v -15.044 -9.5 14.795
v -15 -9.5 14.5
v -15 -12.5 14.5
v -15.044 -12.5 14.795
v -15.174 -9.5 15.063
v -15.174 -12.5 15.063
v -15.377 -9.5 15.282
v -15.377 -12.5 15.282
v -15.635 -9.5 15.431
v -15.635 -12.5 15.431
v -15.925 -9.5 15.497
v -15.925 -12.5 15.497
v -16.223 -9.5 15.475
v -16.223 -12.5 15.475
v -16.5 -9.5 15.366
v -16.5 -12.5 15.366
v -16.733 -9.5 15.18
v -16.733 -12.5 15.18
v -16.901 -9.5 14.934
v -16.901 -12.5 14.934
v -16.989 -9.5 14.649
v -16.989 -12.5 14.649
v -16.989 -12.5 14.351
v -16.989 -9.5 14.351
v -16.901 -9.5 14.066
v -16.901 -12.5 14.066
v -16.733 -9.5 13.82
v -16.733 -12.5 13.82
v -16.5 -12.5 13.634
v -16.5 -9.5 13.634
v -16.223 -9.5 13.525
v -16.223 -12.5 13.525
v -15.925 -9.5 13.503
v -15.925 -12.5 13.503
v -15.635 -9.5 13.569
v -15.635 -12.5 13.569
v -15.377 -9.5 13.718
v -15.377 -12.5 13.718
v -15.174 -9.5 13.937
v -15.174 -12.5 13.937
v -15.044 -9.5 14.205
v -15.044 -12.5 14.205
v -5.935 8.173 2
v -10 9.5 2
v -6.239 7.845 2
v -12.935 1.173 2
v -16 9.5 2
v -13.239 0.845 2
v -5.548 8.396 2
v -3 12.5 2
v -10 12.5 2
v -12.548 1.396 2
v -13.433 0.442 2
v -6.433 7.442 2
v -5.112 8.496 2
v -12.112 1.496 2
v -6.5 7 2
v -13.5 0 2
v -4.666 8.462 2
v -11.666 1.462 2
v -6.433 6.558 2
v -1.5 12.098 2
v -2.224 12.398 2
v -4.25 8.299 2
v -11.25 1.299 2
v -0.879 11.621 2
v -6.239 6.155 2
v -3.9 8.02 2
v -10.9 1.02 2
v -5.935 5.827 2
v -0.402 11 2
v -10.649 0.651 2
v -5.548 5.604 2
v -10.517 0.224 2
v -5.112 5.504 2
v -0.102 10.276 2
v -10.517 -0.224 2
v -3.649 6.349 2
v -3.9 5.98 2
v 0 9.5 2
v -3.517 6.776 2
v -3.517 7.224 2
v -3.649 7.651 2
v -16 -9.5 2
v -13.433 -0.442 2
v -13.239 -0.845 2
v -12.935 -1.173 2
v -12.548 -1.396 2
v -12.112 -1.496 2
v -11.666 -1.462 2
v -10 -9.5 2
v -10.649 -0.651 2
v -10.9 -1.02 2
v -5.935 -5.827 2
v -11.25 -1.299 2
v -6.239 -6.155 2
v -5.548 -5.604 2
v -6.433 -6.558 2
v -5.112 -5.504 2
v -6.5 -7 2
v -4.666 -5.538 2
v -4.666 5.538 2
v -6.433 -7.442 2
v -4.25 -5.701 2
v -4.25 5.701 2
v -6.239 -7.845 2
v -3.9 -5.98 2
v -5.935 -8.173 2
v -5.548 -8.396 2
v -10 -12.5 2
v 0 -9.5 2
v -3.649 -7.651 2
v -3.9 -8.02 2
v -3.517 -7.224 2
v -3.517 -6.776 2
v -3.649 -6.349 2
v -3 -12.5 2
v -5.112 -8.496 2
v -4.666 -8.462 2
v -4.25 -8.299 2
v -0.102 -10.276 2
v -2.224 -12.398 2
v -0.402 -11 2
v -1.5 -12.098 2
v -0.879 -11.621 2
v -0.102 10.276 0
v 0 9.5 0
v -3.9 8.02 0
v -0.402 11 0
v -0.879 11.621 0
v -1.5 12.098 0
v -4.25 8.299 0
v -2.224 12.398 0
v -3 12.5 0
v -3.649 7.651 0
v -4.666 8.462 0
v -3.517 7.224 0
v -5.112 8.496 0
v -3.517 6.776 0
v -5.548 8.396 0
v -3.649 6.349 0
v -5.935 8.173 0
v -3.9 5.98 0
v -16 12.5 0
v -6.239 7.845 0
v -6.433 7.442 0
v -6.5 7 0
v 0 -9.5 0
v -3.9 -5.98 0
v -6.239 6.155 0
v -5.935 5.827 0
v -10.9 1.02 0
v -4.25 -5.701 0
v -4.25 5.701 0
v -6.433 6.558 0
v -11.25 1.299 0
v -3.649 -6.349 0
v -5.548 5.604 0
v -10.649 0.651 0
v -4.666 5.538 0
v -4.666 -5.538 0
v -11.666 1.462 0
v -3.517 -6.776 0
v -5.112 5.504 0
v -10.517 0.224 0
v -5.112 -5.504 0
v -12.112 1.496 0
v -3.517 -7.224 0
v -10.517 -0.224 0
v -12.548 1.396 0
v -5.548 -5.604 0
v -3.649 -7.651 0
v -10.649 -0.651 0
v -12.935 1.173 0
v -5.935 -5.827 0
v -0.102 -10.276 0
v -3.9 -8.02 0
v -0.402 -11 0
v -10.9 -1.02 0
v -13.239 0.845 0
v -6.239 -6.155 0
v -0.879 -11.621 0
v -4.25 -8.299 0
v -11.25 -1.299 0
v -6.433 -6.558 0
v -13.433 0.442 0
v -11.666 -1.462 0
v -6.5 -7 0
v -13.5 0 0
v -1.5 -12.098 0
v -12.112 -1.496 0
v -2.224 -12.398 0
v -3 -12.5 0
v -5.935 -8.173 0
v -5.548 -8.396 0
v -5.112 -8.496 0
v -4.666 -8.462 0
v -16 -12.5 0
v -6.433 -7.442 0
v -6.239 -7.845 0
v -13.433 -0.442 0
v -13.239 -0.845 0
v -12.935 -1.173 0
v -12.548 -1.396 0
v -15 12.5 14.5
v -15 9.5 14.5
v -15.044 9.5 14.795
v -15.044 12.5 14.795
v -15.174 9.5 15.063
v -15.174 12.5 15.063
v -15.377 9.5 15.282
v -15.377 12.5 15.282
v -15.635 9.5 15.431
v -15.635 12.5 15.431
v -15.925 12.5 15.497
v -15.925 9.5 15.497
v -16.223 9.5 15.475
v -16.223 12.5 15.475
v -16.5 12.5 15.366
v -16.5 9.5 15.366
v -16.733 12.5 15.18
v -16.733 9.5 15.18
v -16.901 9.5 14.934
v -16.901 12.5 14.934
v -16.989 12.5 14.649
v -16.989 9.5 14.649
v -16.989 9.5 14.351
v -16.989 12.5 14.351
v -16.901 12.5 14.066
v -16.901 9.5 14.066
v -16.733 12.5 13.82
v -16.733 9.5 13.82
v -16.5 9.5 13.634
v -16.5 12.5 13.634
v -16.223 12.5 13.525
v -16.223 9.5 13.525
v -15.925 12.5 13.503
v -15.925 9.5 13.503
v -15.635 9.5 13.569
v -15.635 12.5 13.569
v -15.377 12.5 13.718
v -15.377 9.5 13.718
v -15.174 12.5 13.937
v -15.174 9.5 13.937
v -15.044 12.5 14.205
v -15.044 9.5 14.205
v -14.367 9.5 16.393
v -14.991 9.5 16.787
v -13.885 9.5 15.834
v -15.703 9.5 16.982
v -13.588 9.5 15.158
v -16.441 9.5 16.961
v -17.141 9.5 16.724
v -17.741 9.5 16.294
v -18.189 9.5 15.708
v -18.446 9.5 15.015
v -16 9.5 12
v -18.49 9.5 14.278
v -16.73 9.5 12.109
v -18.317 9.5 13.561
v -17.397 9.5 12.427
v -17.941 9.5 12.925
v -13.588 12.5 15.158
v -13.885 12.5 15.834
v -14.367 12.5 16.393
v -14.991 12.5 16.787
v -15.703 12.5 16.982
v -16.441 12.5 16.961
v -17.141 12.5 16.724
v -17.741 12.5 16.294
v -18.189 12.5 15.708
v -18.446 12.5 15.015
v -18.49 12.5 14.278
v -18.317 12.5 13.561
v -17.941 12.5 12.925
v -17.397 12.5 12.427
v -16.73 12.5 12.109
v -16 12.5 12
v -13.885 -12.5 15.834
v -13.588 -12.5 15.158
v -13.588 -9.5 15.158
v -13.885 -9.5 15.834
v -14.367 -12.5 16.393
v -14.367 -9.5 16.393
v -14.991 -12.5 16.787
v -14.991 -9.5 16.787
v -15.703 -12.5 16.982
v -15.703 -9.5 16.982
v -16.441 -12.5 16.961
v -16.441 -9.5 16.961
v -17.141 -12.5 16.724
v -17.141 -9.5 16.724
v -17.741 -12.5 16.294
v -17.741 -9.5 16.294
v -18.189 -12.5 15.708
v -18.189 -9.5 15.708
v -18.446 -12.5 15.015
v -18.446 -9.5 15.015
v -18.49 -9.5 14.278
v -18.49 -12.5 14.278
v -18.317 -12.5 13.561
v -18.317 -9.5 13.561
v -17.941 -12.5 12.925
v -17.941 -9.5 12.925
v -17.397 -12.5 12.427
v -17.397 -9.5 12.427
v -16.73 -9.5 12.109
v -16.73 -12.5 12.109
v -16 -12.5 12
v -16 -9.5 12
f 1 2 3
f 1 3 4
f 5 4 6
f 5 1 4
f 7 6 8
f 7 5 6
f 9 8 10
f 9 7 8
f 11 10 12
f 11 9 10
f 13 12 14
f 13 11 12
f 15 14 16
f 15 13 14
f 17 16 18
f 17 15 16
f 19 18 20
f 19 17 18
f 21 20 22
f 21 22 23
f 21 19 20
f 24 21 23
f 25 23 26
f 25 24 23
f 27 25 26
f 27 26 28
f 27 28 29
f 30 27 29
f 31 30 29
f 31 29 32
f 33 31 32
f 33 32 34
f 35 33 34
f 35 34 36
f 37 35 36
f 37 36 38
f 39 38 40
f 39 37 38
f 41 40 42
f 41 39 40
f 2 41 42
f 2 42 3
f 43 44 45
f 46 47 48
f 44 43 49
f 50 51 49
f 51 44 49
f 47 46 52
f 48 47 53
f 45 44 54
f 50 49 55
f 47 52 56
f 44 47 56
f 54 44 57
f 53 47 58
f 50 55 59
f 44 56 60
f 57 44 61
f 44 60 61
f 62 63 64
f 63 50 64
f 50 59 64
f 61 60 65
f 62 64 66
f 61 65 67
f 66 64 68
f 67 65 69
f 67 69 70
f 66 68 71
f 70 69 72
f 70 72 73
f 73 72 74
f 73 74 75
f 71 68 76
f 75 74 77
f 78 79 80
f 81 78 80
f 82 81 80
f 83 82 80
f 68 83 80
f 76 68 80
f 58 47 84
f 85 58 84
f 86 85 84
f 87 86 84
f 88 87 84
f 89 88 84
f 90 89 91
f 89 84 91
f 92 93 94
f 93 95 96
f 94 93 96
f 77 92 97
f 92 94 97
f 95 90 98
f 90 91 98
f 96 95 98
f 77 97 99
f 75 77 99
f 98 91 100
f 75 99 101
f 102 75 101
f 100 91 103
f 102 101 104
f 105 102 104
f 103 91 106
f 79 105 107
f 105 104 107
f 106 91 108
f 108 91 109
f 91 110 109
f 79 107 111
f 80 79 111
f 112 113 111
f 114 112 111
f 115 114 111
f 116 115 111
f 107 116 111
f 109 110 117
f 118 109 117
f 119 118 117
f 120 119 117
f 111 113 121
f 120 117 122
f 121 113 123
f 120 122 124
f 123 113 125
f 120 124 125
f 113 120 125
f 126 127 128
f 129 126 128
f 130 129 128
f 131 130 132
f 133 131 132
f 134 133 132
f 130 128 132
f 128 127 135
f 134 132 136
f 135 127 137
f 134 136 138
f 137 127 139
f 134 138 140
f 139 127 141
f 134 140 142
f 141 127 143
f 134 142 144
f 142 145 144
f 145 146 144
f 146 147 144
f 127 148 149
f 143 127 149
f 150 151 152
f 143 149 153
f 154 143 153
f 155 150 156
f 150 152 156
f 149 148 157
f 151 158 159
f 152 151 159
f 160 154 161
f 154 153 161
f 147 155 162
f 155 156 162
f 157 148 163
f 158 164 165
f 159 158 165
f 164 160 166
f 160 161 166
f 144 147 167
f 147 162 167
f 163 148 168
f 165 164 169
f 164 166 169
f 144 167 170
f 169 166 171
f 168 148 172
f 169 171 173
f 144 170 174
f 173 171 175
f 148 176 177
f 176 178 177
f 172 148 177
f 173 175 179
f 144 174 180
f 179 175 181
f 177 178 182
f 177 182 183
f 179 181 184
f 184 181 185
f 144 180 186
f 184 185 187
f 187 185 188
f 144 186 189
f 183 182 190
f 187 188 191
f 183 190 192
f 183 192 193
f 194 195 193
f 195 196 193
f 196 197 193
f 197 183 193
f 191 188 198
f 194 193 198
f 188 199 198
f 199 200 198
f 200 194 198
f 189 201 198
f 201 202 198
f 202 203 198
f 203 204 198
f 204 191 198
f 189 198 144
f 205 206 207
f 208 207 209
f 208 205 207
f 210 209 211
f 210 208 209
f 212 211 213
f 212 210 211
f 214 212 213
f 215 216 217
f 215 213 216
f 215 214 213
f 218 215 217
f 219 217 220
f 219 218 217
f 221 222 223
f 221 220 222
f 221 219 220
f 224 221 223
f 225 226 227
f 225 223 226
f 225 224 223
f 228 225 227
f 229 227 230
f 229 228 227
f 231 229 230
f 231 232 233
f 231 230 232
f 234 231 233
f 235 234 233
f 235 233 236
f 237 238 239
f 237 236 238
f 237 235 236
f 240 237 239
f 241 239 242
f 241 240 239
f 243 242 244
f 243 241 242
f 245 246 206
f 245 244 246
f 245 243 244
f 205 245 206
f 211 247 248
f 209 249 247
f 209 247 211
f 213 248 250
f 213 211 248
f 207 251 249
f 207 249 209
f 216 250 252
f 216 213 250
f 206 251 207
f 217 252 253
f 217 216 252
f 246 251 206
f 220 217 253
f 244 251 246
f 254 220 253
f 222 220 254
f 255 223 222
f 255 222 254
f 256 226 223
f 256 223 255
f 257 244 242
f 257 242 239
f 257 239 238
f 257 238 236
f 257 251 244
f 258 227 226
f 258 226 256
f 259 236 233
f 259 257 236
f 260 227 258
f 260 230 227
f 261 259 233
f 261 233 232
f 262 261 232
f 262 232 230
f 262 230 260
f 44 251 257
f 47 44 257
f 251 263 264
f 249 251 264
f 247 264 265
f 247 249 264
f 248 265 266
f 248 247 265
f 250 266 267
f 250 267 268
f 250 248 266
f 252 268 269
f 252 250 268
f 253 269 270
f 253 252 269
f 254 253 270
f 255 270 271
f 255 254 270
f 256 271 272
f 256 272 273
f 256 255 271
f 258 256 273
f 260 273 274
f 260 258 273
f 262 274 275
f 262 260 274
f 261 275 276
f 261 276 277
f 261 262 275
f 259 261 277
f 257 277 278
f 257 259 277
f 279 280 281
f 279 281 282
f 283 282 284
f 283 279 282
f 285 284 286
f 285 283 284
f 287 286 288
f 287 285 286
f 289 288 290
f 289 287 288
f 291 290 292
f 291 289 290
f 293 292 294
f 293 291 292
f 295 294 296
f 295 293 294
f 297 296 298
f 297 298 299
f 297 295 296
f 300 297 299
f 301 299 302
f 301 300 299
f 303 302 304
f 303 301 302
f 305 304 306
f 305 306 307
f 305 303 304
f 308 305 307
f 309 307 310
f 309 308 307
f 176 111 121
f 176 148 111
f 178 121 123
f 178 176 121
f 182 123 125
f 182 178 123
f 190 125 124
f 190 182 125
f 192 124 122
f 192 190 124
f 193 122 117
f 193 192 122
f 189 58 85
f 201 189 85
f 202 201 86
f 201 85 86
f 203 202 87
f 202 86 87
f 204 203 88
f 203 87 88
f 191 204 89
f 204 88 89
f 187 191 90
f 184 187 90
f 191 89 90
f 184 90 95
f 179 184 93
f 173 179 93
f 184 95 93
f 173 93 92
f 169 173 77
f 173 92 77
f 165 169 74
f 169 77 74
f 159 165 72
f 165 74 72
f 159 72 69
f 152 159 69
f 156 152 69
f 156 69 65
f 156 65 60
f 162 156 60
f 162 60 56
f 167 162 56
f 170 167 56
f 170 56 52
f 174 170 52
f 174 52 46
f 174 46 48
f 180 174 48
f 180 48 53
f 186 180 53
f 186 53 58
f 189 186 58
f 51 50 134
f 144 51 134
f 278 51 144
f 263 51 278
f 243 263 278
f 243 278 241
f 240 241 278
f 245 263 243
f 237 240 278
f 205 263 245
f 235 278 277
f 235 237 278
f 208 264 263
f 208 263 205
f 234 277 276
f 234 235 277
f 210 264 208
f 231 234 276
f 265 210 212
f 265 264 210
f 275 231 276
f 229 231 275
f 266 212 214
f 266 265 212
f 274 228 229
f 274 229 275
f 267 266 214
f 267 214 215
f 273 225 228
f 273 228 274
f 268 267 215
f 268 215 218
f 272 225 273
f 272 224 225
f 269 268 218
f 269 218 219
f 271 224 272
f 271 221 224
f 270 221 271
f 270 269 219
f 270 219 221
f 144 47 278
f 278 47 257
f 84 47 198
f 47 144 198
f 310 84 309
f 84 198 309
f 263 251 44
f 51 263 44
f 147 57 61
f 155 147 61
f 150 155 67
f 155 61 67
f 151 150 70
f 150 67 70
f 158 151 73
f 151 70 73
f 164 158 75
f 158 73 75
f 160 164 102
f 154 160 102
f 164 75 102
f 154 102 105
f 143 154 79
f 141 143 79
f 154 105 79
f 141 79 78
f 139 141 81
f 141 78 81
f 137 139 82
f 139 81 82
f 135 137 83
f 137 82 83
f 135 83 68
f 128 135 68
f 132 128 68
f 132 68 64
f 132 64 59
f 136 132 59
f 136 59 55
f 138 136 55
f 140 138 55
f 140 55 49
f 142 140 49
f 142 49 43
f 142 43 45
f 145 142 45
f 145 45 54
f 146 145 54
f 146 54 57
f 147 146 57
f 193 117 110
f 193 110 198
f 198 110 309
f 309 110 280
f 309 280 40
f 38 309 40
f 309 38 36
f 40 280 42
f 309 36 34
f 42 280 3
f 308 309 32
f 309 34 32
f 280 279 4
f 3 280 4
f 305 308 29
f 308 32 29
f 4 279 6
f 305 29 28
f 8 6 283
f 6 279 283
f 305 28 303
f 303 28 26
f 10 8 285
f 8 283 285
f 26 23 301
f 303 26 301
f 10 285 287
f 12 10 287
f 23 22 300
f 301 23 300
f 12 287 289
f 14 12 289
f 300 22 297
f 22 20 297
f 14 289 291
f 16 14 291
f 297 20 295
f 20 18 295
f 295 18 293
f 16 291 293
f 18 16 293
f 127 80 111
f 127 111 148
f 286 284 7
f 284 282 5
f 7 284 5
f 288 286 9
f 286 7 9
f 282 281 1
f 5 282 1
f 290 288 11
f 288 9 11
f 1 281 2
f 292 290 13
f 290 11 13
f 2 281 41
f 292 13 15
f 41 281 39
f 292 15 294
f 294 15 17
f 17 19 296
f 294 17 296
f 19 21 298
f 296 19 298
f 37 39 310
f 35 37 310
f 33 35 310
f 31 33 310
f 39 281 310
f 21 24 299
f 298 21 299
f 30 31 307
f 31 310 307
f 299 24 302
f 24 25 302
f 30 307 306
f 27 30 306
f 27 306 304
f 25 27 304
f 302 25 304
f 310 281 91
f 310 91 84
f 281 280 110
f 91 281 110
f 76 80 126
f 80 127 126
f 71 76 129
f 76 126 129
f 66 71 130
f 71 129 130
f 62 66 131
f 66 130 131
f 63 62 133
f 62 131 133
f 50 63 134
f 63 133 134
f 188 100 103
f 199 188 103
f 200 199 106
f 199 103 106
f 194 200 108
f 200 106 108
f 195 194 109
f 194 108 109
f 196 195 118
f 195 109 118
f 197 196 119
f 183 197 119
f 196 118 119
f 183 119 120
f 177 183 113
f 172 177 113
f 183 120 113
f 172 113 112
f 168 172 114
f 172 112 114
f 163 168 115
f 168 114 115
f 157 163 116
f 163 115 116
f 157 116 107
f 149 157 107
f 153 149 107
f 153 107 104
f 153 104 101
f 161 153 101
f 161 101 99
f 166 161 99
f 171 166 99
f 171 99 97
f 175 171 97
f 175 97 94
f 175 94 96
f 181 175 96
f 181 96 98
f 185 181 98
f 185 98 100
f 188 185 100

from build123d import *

# Parameters (mm, degrees)
SKETCH_R    = 1
PAD_DEPTH   = 12.5
BOX_W       = 19
BOX_H       = 19
BOX_DEPTH   = 19
SKETCH001_R = 1.5
HOLE_DEPTH  = 2.001
FILLET_R    = 3


with BuildPart() as part:
    # Sketch → Pad (new body, symmetric)
    with BuildSketch(Plane.XZ):
        with BuildLine():
            Line((0, 0), (-16, 0))
            Line((-16, 0), (-16, 12))
            ThreePointArc((-13.588072, 15.157725), (-17.986745, 16.017512), (-16, 12))
            Line((-13.588072, 15.157725), (-10, 2))
            Line((-10, 2), (0, 2))
            Line((0, 2), (0, 0))
        make_face()
        with Locations((-16, 14.5)):
            Circle(SKETCH_R, mode=Mode.SUBTRACT)
    extrude(amount=PAD_DEPTH, both=True)

    # Box → Box (cut)
    with BuildSketch(Plane(origin=(-7, 9.5, 2), x_dir=(-1, 0, 0), z_dir=(0, 0, 1))):
        with Locations((9.5, 9.5)):
            Rectangle(BOX_W, BOX_H)
    extrude(amount=BOX_DEPTH, mode=Mode.SUBTRACT)

    # Sketch001 (on Face14 of Box) → Hole (cut, through all)
    with BuildSketch(Plane(origin=(-7, 9.5, 2), x_dir=(-1, 0, 0), z_dir=(0, 0, 1))):
        with Locations((5, 9.5)):
            Circle(SKETCH001_R)
        with Locations((-2, 16.5)):
            Circle(SKETCH001_R)
        with Locations((-2, 2.5)):
            Circle(SKETCH001_R)
    extrude(amount=-HOLE_DEPTH, mode=Mode.SUBTRACT)

    # Fillet
    fillet_edges = [part.edges().sort_by_distance(p)[0] for p in [
        (0, 12.5, 1),
        (0, -12.5, 1),
    ]]
    fillet(fillet_edges, radius=FILLET_R)


solid = part.part
